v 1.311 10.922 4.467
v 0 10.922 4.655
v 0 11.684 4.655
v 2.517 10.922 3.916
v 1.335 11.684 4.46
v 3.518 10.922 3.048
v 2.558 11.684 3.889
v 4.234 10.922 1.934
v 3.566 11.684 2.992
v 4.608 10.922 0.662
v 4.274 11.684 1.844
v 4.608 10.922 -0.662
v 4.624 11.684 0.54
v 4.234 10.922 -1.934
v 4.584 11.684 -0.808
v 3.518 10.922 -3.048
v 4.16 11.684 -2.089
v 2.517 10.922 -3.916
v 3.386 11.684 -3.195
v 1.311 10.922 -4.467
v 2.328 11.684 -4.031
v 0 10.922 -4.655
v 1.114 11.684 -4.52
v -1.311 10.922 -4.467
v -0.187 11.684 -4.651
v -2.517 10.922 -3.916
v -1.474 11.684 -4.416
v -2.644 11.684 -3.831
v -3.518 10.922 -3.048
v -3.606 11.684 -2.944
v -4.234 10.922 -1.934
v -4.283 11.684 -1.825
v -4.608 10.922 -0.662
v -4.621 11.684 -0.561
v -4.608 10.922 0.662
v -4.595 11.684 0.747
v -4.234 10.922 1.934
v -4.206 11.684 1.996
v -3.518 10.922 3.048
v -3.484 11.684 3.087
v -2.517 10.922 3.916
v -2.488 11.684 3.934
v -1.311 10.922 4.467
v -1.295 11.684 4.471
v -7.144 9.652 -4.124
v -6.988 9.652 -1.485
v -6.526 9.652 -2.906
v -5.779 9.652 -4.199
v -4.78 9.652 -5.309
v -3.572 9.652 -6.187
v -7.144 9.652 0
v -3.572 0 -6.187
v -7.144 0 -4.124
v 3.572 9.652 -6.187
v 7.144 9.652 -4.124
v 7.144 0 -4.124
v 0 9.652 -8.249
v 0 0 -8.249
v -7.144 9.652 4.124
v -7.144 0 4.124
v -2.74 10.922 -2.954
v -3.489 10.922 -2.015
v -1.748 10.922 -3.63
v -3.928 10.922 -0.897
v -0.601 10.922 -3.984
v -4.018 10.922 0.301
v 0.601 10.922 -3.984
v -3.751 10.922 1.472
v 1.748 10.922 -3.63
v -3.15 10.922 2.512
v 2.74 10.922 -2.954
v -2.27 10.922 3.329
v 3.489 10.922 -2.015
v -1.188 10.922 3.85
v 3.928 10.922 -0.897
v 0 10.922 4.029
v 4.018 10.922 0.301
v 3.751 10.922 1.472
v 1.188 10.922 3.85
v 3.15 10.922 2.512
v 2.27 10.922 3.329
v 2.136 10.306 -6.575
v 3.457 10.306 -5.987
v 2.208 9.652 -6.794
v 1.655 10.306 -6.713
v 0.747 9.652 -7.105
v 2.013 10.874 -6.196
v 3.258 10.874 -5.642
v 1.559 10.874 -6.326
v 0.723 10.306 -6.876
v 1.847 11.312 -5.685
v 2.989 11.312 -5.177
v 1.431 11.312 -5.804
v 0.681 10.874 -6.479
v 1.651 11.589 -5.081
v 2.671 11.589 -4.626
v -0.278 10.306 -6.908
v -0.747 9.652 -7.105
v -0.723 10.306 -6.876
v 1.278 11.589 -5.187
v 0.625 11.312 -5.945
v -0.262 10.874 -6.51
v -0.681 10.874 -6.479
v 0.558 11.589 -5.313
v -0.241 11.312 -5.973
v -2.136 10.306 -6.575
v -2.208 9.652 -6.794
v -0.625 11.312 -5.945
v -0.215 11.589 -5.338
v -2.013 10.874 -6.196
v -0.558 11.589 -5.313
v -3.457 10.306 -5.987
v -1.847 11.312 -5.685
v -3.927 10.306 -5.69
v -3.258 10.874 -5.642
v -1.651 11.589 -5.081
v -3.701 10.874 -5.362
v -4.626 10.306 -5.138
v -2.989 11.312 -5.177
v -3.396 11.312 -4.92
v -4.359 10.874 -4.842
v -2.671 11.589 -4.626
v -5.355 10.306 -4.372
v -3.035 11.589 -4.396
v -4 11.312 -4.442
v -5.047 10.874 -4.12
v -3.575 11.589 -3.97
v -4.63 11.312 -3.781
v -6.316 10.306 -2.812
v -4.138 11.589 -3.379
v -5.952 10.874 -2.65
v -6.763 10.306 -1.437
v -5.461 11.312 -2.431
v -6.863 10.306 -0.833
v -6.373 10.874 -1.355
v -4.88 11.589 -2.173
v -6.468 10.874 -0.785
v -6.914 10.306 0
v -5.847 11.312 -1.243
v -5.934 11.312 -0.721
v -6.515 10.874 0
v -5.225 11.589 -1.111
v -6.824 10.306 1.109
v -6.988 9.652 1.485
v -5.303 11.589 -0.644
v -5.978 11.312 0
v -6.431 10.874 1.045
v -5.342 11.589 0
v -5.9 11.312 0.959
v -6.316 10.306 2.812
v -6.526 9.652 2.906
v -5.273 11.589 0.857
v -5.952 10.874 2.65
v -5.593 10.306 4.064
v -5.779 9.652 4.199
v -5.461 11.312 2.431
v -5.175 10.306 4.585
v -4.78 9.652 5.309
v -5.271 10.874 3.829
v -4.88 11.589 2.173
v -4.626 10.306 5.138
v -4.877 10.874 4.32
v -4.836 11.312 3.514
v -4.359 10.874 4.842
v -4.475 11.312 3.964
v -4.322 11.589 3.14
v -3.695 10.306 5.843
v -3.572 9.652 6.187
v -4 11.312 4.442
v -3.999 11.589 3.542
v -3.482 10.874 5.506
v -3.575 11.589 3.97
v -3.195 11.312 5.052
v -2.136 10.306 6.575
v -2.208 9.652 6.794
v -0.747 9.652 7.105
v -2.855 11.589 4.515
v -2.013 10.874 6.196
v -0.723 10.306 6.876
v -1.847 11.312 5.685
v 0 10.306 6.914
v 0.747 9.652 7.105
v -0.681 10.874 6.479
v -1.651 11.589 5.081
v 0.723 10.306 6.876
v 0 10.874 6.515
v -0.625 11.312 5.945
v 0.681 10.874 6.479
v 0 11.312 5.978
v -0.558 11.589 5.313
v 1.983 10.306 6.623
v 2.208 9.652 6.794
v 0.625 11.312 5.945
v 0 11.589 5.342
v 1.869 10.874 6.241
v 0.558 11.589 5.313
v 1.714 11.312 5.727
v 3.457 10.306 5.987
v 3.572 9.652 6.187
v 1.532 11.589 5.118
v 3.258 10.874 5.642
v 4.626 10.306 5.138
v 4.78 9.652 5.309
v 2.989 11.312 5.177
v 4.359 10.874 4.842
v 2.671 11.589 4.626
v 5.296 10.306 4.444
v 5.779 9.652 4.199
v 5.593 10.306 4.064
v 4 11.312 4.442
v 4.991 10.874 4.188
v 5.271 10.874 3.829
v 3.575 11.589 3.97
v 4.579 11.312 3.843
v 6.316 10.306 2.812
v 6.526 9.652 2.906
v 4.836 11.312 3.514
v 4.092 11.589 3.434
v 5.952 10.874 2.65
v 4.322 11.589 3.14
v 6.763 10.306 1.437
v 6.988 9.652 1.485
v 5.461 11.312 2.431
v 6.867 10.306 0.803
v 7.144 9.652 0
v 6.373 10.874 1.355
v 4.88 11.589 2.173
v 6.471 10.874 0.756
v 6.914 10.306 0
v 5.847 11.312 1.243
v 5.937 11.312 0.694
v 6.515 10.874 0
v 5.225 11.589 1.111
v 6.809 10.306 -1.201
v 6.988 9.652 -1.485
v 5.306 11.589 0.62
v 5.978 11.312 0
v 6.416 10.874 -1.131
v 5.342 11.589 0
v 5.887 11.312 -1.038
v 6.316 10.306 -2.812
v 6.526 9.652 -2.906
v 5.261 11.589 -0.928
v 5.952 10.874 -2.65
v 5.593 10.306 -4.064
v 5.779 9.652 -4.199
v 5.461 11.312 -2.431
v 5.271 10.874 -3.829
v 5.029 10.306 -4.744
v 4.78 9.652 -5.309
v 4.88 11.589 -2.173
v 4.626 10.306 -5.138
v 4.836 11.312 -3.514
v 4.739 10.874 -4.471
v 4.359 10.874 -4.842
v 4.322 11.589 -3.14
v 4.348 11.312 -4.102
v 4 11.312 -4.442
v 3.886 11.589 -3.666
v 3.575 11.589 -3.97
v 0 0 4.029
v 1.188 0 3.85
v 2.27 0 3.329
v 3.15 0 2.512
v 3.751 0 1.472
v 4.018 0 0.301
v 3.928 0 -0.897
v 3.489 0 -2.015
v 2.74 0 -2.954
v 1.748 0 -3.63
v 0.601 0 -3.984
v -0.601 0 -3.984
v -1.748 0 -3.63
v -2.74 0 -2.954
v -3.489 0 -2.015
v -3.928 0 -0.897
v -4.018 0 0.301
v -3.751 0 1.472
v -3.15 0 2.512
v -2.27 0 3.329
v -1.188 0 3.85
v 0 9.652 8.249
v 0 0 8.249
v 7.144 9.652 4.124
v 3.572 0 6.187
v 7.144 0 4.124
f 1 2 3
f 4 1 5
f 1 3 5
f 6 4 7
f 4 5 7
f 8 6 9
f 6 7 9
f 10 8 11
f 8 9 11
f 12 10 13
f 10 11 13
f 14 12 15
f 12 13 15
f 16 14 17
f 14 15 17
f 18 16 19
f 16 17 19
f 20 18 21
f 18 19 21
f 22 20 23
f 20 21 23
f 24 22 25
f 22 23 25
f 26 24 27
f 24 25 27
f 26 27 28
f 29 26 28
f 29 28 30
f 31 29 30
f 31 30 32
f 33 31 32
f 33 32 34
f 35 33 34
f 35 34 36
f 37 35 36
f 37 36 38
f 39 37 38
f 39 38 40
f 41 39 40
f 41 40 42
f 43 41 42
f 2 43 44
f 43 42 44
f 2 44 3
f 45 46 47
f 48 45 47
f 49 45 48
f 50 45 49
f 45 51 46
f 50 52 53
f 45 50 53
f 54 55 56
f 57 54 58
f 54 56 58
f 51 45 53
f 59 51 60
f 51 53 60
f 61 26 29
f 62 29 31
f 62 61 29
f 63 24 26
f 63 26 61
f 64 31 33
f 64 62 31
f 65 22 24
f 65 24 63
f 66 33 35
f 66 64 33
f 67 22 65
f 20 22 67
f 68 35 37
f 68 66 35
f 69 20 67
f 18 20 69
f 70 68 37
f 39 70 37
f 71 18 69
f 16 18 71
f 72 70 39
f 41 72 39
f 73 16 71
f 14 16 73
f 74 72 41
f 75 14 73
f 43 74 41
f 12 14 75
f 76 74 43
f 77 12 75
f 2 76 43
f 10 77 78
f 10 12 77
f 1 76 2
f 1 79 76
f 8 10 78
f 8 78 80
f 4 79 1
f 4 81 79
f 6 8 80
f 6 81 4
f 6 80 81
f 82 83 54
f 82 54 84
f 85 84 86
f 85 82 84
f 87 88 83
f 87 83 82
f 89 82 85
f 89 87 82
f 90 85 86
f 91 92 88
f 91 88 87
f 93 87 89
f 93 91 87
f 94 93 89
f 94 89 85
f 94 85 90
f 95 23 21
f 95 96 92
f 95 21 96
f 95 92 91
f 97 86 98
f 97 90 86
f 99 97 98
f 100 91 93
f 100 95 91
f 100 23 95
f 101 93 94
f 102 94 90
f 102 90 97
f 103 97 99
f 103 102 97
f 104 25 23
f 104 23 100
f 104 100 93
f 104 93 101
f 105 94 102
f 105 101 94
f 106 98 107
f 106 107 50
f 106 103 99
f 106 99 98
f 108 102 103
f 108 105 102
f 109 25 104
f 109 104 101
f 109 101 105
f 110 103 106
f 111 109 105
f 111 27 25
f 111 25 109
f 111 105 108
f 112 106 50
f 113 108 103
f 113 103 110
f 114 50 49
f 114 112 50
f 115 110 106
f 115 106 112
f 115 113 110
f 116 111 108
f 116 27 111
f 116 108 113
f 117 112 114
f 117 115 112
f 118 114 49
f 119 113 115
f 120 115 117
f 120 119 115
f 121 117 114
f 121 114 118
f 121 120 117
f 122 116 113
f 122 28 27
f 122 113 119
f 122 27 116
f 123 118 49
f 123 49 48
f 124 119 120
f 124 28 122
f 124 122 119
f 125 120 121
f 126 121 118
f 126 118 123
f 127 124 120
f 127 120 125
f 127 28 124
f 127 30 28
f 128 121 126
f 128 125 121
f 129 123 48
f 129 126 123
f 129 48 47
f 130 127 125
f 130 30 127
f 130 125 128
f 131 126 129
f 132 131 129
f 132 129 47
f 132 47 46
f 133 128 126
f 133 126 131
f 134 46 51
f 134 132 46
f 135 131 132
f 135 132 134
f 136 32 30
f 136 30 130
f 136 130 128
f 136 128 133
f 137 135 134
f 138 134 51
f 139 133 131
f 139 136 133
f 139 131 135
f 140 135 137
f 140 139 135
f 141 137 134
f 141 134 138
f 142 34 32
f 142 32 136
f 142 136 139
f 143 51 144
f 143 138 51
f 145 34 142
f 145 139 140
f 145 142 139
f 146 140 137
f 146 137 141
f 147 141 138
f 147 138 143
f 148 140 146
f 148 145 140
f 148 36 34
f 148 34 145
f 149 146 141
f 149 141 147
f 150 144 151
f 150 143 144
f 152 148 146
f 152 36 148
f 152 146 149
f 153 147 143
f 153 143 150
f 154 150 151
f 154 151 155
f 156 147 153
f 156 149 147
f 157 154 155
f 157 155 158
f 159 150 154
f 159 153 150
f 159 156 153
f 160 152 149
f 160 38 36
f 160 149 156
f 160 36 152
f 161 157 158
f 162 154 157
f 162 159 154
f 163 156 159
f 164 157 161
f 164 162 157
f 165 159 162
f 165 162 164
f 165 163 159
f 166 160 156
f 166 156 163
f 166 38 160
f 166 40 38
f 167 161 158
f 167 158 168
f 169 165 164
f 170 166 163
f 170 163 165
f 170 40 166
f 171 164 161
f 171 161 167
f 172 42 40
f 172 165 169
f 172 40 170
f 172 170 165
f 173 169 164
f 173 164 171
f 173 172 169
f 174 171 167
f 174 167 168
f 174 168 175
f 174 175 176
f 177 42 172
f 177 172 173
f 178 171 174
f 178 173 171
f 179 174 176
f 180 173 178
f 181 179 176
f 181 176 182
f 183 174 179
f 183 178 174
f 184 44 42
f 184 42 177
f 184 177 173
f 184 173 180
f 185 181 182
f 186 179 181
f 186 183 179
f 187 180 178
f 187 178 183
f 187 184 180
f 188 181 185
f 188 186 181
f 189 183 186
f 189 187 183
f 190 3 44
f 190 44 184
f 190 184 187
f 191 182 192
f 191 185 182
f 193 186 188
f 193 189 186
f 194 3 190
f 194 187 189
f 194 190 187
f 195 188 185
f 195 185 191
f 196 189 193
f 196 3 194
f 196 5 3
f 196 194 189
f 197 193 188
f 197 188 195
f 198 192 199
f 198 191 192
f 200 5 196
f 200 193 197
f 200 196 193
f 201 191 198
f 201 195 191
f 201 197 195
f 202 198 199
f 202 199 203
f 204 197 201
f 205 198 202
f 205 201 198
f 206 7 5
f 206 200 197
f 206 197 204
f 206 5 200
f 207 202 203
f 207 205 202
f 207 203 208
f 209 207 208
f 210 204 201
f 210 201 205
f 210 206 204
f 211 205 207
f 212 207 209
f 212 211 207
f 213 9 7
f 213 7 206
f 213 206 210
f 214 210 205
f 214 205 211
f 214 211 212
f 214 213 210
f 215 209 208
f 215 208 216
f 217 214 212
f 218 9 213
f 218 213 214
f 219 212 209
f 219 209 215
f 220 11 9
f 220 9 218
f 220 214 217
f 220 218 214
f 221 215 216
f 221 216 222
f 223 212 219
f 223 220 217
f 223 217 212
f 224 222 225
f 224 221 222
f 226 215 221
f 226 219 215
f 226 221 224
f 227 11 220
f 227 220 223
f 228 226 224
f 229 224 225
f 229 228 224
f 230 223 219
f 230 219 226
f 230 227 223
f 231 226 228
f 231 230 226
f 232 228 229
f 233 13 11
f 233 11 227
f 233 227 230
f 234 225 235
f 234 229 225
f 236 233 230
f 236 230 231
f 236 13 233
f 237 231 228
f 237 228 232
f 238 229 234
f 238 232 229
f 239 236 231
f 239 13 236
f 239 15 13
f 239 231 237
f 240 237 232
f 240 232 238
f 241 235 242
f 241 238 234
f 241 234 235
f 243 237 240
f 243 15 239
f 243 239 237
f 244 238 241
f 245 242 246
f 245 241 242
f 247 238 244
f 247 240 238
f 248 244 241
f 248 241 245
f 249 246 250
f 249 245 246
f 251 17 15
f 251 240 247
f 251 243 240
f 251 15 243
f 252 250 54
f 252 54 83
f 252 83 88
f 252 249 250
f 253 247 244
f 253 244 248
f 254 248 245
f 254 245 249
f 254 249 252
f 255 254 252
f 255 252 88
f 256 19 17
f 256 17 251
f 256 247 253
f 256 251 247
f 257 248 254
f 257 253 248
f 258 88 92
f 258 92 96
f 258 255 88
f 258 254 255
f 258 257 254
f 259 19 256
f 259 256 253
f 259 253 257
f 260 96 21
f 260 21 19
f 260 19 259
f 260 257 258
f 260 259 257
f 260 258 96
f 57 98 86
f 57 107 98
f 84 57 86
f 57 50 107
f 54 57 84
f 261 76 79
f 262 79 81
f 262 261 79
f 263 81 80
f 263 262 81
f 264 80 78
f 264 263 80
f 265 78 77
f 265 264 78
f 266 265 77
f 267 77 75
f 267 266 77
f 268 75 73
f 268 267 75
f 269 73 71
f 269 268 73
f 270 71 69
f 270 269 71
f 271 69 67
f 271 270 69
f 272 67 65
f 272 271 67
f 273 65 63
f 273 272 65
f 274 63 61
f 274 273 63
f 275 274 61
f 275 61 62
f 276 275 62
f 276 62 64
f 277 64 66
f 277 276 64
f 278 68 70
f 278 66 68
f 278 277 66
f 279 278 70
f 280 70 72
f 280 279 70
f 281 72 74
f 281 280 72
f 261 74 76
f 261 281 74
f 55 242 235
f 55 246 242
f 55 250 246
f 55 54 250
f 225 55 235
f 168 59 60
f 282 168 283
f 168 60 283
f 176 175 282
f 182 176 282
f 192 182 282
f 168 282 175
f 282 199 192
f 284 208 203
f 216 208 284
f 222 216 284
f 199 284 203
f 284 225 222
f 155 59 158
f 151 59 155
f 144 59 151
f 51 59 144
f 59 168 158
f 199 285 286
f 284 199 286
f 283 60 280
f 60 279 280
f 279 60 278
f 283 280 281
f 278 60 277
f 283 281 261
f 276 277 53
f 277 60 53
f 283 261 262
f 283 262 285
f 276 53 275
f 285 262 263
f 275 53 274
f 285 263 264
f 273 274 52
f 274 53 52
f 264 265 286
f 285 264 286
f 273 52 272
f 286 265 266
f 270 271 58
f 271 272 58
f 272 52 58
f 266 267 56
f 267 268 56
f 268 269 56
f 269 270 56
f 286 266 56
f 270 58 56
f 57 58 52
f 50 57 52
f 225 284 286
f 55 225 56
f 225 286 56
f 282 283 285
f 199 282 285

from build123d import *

# Parameters (mm, degrees)
SKETCH1_R           = 4.029111805
BOSS_EXTRUDE3_DEPTH = 9.652
SKETCH3_R           = 7.14375
SKETCH3_R_2         = 4.029111805
BOSS_EXTRUDE4_DEPTH = 2.032
FILLET2_R           = 2.54
SKETCH4_R           = 4.655068421
CUT_EXTRUDE1_DEPTH  = 0.762


with BuildPart() as part:
    # Sketch1 → Boss-Extrude3 (new body)
    with BuildSketch(Plane(origin=(0, 0, 0), x_dir=(1, 0, 0), z_dir=(0, 1, 0))):
        Polygon((-7.14375, 4.124445986), (-7.14375, 0), (-7.14375, -4.124445986), (0, -8.248891971), (3.571875, -6.186668978), (7.14375, -4.124445986), (7.14375, 0), (7.14375, 4.124445986), (0, 8.248891971), (-3.571875, 6.186668978), align=None)
        with Locations(Location((0, 0, 0), (0, 0, 270))):
            Circle(SKETCH1_R, mode=Mode.SUBTRACT)
    extrude(amount=BOSS_EXTRUDE3_DEPTH)

    # Sketch3 → Boss-Extrude4 (add)
    with BuildSketch(Plane(origin=(0, 9.652, 0), x_dir=(1, 0, 0), z_dir=(0, 1, 0))):
        with Locations(Location((0, 0, 0), (0, 0, 60))):
            Circle(SKETCH3_R)
        with Locations(Location((0, 0, 0), (0, 0, 270))):
            Circle(SKETCH3_R_2, mode=Mode.SUBTRACT)
    extrude(amount=BOSS_EXTRUDE4_DEPTH)

    # Fillet2
    # the kernel refuses this fillet: 2.54 mm, written as the material it takes off along each edge
    with BuildSketch(Plane(origin=(0, 11.684, 0), x_dir=(0.5000000000000001, 0, -0.8660254037844386), z_dir=(0.8660254037844386, 0, 0.5000000000000001))) as fillet2_piece_1:
        with BuildLine():
            CenterArc((4.655068421, -2.54), FILLET2_R, 11.536959033, 78.463040967)
            Line((7.14375, -2.032), (7.193523632, -2.02184))
            ThreePointArc((7.193523632, -2.02184), (7.19455, -1.016), (7.19455, 0))
            Line((7.19455, 0), (7.14375, 0.0508))
            Line((7.14375, 0.0508), (4.655068421, 0.0508))
            Line((4.655068421, 0.0508), (4.655068421, 0))
        make_face()
    revolve(axis=Axis((0, 11.684, 0), (0, 1, 0)), mode=Mode.SUBTRACT)

    # Sketch4 → Cut-Extrude1 (cut)
    with BuildSketch(Plane(origin=(0, 11.684, 0), x_dir=(1, 0, 0), z_dir=(0, 1, 0))):
        with Locations(Location((0, 0, 0), (0, 0, 270))):
            Circle(SKETCH4_R)
    extrude(amount=-CUT_EXTRUDE1_DEPTH, mode=Mode.SUBTRACT)


solid = part.part
